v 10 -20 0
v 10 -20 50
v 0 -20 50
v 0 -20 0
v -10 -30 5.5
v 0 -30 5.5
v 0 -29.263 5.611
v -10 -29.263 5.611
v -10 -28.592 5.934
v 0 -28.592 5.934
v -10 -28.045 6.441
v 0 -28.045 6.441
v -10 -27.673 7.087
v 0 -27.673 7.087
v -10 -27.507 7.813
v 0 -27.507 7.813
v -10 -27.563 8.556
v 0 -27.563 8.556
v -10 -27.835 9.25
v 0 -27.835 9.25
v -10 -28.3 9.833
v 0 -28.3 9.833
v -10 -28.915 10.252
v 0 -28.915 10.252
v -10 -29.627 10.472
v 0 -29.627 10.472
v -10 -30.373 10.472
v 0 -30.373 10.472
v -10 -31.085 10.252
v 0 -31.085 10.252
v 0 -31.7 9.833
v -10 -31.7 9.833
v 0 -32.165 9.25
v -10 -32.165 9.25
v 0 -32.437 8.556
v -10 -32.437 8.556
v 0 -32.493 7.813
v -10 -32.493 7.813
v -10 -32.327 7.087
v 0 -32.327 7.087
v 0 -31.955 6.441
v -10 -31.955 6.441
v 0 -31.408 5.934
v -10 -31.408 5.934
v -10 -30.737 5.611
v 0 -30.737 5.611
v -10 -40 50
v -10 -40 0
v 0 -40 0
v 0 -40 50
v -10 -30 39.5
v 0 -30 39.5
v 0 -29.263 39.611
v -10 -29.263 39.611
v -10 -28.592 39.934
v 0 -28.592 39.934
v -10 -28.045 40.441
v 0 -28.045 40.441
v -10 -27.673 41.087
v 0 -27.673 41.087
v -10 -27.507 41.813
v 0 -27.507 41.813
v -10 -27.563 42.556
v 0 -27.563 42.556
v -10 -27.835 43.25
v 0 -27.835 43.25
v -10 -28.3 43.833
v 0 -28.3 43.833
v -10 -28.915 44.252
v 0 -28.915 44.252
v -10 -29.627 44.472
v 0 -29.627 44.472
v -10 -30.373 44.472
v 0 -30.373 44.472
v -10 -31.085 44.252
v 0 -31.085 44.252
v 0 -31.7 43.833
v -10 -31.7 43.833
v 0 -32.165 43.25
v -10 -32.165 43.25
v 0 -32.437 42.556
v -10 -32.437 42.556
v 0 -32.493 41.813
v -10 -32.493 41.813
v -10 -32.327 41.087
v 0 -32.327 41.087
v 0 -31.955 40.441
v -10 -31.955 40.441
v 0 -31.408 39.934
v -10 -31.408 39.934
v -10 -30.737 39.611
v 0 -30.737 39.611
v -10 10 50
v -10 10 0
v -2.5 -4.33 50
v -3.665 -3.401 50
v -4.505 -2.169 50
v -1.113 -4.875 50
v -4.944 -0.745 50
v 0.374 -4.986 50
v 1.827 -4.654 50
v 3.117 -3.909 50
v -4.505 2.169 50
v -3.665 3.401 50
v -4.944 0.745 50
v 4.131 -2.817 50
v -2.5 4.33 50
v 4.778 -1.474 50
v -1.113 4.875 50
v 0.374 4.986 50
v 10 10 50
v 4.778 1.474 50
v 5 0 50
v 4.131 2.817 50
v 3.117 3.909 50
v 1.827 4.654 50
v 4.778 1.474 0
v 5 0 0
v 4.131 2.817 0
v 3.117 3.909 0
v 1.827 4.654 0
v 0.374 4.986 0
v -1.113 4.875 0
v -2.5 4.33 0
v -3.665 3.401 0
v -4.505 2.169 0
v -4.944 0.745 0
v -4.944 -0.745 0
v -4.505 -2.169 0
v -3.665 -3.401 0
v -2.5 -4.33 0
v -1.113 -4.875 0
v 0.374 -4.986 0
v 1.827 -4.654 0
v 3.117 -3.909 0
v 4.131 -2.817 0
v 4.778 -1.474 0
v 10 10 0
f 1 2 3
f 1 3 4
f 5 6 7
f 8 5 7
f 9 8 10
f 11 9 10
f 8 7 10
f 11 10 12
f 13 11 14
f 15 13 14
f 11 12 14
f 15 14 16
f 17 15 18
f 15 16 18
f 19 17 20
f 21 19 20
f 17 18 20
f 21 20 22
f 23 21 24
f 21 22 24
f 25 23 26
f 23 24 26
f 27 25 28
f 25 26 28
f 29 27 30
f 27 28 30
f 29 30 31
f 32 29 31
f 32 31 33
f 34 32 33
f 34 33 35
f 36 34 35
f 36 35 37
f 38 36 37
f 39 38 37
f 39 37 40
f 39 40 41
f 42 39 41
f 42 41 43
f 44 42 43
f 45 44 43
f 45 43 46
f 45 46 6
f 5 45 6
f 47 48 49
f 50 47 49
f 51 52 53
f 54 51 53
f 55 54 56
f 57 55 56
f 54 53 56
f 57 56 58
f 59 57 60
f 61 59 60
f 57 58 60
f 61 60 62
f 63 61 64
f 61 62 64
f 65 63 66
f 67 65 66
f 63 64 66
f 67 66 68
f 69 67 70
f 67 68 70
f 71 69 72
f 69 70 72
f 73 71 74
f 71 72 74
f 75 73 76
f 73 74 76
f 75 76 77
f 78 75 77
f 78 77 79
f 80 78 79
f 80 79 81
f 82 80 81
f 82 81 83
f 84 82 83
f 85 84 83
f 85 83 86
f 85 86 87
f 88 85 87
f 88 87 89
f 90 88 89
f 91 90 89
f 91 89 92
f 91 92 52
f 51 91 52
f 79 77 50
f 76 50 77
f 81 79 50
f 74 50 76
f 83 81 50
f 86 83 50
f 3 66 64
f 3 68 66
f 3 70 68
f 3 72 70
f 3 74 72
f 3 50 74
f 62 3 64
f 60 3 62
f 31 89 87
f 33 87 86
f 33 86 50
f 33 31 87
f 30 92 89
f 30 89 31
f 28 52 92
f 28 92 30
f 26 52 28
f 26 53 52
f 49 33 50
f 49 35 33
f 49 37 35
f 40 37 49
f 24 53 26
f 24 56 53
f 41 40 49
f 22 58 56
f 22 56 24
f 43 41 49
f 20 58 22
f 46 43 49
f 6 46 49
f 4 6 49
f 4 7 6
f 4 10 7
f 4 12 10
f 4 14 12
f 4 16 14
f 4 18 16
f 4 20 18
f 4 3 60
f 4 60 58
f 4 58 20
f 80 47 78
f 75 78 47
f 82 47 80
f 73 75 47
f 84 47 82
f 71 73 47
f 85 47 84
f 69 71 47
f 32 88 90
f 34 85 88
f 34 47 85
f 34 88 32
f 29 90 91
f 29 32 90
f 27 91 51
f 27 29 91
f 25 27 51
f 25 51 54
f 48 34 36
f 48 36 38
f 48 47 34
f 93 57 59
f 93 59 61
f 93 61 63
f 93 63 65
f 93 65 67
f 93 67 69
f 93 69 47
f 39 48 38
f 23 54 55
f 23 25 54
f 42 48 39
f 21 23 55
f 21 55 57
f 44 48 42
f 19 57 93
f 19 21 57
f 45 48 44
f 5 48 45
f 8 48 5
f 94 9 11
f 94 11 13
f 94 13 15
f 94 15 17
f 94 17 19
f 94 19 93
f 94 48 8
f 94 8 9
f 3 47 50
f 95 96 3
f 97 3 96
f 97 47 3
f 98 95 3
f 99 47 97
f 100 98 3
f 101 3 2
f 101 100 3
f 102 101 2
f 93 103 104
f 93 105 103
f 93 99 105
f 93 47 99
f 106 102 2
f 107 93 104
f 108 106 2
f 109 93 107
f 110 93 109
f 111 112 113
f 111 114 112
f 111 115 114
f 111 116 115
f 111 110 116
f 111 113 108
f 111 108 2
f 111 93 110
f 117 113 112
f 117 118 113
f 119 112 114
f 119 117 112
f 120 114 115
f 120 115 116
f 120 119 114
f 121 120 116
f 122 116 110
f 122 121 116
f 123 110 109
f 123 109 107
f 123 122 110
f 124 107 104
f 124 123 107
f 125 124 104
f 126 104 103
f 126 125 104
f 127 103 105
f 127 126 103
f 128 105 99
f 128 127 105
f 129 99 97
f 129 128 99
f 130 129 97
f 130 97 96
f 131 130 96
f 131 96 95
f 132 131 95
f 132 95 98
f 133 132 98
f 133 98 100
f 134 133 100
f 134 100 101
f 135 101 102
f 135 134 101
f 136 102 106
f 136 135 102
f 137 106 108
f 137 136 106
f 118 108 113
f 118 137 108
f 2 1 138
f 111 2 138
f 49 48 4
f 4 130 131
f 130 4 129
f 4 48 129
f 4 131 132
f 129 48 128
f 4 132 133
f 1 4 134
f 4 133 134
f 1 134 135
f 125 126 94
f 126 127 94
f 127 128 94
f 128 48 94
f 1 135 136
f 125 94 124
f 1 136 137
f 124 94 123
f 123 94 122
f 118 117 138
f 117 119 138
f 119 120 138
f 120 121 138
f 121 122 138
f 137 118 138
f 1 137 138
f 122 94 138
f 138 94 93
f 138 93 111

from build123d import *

# Parameters (mm, degrees)
ESQUISSE1_W             = 20
ESQUISSE1_H             = 20
ESQUISSE1_R             = 5
ESQUISSE1_H_2           = 30
BOSS_EXTRU_1_DEPTH      = 15
ESQUISSE2_W             = 20
ESQUISSE2_H             = 50
ESQUISSE2_R             = 5
BOSS_EXTRU_2_DEPTH      = 35
ESQUISSE3_R             = 2.5
ENL_V_MAT_EXTRU_1_DEPTH = 30
ESQUISSE4_W             = 50
ESQUISSE4_H             = 20
ENL_V_MAT_EXTRU_2_DEPTH = 10


with BuildPart() as part:
    # Esquisse1 → Boss.-Extru.1 (new body)
    with BuildSketch(Plane.XY):
        Rectangle(ESQUISSE1_W, ESQUISSE1_H)
        Circle(ESQUISSE1_R, mode=Mode.SUBTRACT)
        with Locations((0, -25)):
            Rectangle(ESQUISSE1_W, ESQUISSE1_H_2)
    extrude(amount=BOSS_EXTRU_1_DEPTH)

    # Esquisse2 → Boss.-Extru.2 (add)
    with BuildSketch(Plane.XY.offset(15)):
        with Locations((0, -15)):
            Rectangle(ESQUISSE2_W, ESQUISSE2_H)
        Circle(ESQUISSE2_R, mode=Mode.SUBTRACT)
    extrude(amount=BOSS_EXTRU_2_DEPTH)

    # Esquisse3 → Enlèv. mat.-Extru.1 (cut)
    with BuildSketch(Plane(origin=(10, 0, 0), x_dir=(0, 0, -1), z_dir=(1, 0, 0))):
        with Locations((-42, -30)):
            Circle(ESQUISSE3_R)
        with Locations((-8, -30)):
            Circle(ESQUISSE3_R)
    extrude(amount=-ENL_V_MAT_EXTRU_1_DEPTH, mode=Mode.SUBTRACT)

    # Esquisse4 → Enlèv. mat.-Extru.2 (cut)
    with BuildSketch(Plane(origin=(10, 0, 0), x_dir=(0, 0, -1), z_dir=(1, 0, 0))):
        with Locations((-25, -30)):
            Rectangle(ESQUISSE4_W, ESQUISSE4_H)
    extrude(amount=-ENL_V_MAT_EXTRU_2_DEPTH, mode=Mode.SUBTRACT)


solid = part.part
